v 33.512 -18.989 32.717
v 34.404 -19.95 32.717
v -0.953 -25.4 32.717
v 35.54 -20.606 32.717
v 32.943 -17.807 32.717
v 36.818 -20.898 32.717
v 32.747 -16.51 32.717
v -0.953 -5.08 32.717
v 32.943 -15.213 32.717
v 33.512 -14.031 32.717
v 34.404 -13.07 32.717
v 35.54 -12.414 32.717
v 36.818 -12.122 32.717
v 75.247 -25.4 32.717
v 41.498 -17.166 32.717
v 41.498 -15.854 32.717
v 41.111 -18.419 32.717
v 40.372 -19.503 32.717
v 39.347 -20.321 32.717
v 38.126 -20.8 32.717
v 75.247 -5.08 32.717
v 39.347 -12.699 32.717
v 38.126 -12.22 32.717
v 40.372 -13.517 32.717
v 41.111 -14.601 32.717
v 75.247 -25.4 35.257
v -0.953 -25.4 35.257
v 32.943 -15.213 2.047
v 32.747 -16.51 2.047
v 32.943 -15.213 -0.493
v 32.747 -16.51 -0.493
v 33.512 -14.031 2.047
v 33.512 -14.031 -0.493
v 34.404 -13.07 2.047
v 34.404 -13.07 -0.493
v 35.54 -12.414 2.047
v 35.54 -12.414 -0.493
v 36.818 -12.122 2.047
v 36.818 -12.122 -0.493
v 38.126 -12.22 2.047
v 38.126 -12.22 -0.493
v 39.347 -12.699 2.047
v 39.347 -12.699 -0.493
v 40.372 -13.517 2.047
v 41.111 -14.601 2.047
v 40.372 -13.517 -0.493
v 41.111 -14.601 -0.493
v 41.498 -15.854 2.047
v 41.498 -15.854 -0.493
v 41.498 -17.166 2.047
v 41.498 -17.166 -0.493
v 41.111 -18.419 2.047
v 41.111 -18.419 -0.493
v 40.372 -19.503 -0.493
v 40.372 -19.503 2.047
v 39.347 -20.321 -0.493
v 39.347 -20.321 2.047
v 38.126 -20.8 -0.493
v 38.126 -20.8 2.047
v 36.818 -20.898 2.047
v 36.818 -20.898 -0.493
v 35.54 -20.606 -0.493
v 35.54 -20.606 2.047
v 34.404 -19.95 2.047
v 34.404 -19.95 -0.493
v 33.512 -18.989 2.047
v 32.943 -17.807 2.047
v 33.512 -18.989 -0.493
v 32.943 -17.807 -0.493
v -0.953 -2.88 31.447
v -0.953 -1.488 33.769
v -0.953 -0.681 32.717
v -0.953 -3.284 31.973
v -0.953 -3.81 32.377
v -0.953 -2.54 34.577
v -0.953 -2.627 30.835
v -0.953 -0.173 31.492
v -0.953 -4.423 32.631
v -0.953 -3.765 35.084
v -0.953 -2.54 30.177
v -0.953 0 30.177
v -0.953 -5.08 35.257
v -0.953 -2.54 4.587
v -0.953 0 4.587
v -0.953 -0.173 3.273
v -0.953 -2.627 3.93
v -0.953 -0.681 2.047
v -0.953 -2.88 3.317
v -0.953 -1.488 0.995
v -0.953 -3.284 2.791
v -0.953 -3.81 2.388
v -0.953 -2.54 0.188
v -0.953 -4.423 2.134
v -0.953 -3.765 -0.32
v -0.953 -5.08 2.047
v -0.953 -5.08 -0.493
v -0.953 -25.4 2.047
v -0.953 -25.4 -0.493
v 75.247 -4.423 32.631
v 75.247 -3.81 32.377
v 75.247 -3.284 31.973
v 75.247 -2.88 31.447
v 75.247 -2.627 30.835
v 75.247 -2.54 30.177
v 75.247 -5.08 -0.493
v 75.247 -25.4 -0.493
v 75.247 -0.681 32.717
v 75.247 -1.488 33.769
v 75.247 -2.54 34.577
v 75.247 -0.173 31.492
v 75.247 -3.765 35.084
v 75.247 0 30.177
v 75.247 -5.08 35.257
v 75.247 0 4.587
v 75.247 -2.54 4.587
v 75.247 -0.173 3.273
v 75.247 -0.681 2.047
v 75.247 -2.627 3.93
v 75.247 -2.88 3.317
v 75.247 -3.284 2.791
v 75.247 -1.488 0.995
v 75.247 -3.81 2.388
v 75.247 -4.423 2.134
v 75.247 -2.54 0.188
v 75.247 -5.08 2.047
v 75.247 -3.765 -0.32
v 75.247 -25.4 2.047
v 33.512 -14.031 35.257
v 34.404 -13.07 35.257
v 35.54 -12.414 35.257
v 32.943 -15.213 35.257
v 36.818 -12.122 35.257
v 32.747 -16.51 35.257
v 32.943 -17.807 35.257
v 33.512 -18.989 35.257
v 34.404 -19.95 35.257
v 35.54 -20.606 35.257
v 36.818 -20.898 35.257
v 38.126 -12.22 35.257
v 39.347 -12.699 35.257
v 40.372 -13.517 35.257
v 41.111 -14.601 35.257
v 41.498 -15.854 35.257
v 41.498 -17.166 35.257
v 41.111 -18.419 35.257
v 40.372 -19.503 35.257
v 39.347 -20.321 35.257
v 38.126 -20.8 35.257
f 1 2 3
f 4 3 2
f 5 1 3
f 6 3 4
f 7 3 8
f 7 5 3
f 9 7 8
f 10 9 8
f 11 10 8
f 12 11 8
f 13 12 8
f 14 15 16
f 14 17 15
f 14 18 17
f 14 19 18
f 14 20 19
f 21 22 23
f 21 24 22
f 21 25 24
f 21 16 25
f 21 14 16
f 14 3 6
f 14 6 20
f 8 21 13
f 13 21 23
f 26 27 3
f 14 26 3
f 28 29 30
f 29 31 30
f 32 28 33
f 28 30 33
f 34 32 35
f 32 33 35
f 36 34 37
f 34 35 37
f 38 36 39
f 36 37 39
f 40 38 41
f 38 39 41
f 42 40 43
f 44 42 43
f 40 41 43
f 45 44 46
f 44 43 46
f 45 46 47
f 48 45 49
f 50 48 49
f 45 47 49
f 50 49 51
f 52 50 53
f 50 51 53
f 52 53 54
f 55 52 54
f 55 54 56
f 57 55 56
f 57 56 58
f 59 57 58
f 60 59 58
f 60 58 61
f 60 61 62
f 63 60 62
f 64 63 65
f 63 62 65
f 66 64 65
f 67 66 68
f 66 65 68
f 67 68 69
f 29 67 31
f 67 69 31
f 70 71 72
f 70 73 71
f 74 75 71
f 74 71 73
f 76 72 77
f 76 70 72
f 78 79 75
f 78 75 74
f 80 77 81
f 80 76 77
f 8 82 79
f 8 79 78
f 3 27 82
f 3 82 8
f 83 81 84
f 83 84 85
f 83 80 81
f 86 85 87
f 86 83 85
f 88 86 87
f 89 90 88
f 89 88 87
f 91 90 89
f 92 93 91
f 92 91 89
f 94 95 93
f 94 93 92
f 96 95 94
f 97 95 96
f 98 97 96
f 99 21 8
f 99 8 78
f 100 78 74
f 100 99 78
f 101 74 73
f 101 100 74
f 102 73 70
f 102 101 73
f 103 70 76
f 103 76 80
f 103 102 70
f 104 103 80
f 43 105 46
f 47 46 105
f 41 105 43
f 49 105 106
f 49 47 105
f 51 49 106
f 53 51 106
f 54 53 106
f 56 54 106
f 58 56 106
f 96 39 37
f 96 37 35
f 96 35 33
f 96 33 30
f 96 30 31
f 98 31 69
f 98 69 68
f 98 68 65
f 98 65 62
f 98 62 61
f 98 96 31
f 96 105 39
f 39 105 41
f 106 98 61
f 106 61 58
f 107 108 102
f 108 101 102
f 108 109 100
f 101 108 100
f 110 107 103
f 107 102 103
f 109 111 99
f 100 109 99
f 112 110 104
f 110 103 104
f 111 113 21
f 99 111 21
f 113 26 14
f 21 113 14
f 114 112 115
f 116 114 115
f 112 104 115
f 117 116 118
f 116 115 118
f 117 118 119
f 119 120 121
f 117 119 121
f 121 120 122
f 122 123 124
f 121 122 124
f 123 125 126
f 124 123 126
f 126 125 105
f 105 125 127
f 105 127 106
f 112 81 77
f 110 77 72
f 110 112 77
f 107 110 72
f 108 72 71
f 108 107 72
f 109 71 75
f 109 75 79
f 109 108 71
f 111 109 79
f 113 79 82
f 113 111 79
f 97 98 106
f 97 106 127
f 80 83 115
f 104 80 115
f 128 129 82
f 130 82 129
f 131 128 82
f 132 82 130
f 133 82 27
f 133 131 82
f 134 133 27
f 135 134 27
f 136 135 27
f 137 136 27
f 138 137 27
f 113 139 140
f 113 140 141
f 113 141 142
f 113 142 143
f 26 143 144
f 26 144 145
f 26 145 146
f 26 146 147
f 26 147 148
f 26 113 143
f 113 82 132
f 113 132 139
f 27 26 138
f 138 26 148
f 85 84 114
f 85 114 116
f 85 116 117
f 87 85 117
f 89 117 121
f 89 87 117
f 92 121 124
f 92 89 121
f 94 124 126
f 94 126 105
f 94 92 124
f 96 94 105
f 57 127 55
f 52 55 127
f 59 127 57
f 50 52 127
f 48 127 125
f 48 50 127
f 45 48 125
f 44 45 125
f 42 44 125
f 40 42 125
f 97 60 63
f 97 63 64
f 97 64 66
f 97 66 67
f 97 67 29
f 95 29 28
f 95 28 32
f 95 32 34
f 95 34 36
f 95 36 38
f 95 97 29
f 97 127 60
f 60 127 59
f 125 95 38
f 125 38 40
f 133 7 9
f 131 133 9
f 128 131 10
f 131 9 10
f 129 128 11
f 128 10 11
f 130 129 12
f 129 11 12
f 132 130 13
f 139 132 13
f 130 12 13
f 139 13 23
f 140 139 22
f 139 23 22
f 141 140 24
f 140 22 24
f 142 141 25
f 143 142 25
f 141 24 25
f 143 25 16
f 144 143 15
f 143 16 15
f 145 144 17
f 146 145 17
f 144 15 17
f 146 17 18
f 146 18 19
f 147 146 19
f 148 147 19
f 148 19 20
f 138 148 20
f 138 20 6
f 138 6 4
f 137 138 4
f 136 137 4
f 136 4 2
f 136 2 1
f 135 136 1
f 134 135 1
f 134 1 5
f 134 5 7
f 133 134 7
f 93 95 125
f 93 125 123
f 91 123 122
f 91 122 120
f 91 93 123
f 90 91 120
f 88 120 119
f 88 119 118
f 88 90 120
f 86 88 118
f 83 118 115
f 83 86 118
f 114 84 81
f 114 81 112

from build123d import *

# Parameters (mm, degrees)
SKETCH1_W                         = 76.2
SKETCH1_H                         = 35.75
BASE_FLANGE1_DEPTH                = 2.54
EDGE_FLANGE1_STRIP_W              = 15.24
EDGE_FLANGE1_STRIP_H              = 2.54
EDGE_FLANGE1_STRIP_CUT_DEPTH      = 76.2
EDGE_FLANGE1_STRIP_2_W            = 15.24
EDGE_FLANGE1_STRIP_2_H            = 2.54
EDGE_FLANGE1_STRIP_CUT_2_DEPTH    = 76.2
EDGE_FLANGE1_DEPTH                = 76.2
EDGE_FLANGE1_BEND_DEPTH           = 76.2
TAP_DRILL_FOR_M10X1_25_TAP1_D     = 8.8
TAP_DRILL_FOR_M10X1_25_TAP1_DEPTH = 35.75
TAP_DRILL_FOR_M10X1_25_TAP1_TIP   = 2.643786724


# Sheet-metal steps are written as plain solids
with BuildPart() as part:
    # Sketch1 → Base-Flange1 (new body)
    with BuildSketch(Plane(origin=(0, 0, 0), x_dir=(1, 0, 0), z_dir=(0, 1, 0))):
        with Locations((37.147058824, -17.382352941)):
            Rectangle(SKETCH1_W, SKETCH1_H)
    extrude(amount=-BASE_FLANGE1_DEPTH)

    # Edge-Flange1 strip (across the edge) → Edge-Flange1 strip cut (cut)
    with BuildSketch(Plane(origin=(75.247058824, -2.54, 35.257352941), x_dir=(0, 0, -1), z_dir=(-1, 0, 0))):
        with Locations((-2.54, -1.27)):
            Rectangle(EDGE_FLANGE1_STRIP_W, EDGE_FLANGE1_STRIP_H)
    extrude(amount=EDGE_FLANGE1_STRIP_CUT_DEPTH, mode=Mode.SUBTRACT)

    # Edge-Flange1 strip 2 (across the edge) → Edge-Flange1 strip cut 2 (cut)
    with BuildSketch(Plane(origin=(-0.952941176, -2.54, -0.492647059), x_dir=(0, 0, 1), z_dir=(1, 0, 0))):
        with Locations((-2.54, -1.27)):
            Rectangle(EDGE_FLANGE1_STRIP_2_W, EDGE_FLANGE1_STRIP_2_H)
    extrude(amount=EDGE_FLANGE1_STRIP_CUT_2_DEPTH, mode=Mode.SUBTRACT)

    # Edge-Flange1 section (across the edge) → Edge-Flange1 (add)
    with BuildSketch(Plane(origin=(75.247058824, -2.54, 35.257352941), x_dir=(0, 0, -1), z_dir=(-1, 0, 0))):
        with BuildLine():
            Line((0, 2.54), (0, 22.86))
            Line((0, 22.86), (2.54, 22.86))
            Line((2.54, 22.86), (2.54, 2.54))
            ThreePointArc((2.54, 2.54), (3.283948776, 0.743948776), (5.08, 0))
            Line((5.08, 0), (5.08, -2.54))
            ThreePointArc((5.08, -2.54), (1.487897552, -1.052102448), (0, 2.54))
        make_face()
    extrude(amount=EDGE_FLANGE1_DEPTH)

    # Edge-Flange1 section 2 (across the edge) → Edge-Flange1 bend (add)
    with BuildSketch(Plane(origin=(-0.952941176, -2.54, -0.492647059), x_dir=(0, 0, 1), z_dir=(1, 0, 0))):
        with BuildLine():
            Line((0, 2.54), (0, 22.86))
            Line((0, 22.86), (2.54, 22.86))
            Line((2.54, 22.86), (2.54, 2.54))
            ThreePointArc((2.54, 2.54), (3.283948776, 0.743948776), (5.08, 0))
            Line((5.08, 0), (5.08, -2.54))
            ThreePointArc((5.08, -2.54), (1.487897552, -1.052102448), (0, 2.54))
        make_face()
    extrude(amount=EDGE_FLANGE1_BEND_DEPTH)

    # Tap Drill for M10x1.25 Tap1
    with Locations(Plane.XY.offset(35.257352941)):
        with Locations((37.147058824, -16.51)):
            Hole(TAP_DRILL_FOR_M10X1_25_TAP1_D / 2, depth=TAP_DRILL_FOR_M10X1_25_TAP1_DEPTH)
            with Locations((0, 0, -(TAP_DRILL_FOR_M10X1_25_TAP1_DEPTH + TAP_DRILL_FOR_M10X1_25_TAP1_TIP / 2))):  # 118° drill point
                Cone(0, TAP_DRILL_FOR_M10X1_25_TAP1_D / 2, TAP_DRILL_FOR_M10X1_25_TAP1_TIP, mode=Mode.SUBTRACT)


solid = part.part
